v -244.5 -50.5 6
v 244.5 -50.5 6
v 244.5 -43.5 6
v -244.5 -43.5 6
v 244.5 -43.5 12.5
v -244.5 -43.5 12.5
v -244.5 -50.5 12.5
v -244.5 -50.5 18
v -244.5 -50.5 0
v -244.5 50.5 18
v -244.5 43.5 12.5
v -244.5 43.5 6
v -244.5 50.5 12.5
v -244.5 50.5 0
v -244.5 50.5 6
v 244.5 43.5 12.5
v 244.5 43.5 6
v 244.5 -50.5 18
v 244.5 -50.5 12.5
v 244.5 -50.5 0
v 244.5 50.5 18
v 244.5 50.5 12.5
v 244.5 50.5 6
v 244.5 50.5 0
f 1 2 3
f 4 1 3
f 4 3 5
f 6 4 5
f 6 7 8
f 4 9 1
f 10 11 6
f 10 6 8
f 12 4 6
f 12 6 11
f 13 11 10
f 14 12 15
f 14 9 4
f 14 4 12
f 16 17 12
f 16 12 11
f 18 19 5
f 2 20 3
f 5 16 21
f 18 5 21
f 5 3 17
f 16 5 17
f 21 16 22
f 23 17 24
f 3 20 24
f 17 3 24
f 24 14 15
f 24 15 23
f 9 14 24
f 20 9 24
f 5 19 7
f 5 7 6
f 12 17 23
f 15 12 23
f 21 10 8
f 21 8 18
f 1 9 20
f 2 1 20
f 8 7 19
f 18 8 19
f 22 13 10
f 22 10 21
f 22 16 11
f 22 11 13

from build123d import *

# Parameters (mm, degrees)
SKETCH_W          = 489
SKETCH_H          = 101
PAD_DEPTH         = 18
SKETCH001_W       = 7
SKETCH001_H       = 6.5
POCKET_DEPTH      = 550
POCKET_DEPTH_BACK = -555


with BuildPart() as part:
    # Sketch → Pad (new body)
    with BuildSketch(Plane.XY):
        Rectangle(SKETCH_W, SKETCH_H)
    extrude(amount=PAD_DEPTH)

    # Sketch001 → Pocket (cut, two sides)
    with BuildSketch(Plane.YZ) as pocket_sk:
        with Locations((47, 9.25)):
            Rectangle(SKETCH001_W, SKETCH001_H)
        with Locations((-47, 9.25)):
            Rectangle(SKETCH001_W, SKETCH001_H)
    extrude(amount=-POCKET_DEPTH, mode=Mode.SUBTRACT)
    extrude(pocket_sk.sketch, amount=-POCKET_DEPTH_BACK, mode=Mode.SUBTRACT)


solid = part.part
